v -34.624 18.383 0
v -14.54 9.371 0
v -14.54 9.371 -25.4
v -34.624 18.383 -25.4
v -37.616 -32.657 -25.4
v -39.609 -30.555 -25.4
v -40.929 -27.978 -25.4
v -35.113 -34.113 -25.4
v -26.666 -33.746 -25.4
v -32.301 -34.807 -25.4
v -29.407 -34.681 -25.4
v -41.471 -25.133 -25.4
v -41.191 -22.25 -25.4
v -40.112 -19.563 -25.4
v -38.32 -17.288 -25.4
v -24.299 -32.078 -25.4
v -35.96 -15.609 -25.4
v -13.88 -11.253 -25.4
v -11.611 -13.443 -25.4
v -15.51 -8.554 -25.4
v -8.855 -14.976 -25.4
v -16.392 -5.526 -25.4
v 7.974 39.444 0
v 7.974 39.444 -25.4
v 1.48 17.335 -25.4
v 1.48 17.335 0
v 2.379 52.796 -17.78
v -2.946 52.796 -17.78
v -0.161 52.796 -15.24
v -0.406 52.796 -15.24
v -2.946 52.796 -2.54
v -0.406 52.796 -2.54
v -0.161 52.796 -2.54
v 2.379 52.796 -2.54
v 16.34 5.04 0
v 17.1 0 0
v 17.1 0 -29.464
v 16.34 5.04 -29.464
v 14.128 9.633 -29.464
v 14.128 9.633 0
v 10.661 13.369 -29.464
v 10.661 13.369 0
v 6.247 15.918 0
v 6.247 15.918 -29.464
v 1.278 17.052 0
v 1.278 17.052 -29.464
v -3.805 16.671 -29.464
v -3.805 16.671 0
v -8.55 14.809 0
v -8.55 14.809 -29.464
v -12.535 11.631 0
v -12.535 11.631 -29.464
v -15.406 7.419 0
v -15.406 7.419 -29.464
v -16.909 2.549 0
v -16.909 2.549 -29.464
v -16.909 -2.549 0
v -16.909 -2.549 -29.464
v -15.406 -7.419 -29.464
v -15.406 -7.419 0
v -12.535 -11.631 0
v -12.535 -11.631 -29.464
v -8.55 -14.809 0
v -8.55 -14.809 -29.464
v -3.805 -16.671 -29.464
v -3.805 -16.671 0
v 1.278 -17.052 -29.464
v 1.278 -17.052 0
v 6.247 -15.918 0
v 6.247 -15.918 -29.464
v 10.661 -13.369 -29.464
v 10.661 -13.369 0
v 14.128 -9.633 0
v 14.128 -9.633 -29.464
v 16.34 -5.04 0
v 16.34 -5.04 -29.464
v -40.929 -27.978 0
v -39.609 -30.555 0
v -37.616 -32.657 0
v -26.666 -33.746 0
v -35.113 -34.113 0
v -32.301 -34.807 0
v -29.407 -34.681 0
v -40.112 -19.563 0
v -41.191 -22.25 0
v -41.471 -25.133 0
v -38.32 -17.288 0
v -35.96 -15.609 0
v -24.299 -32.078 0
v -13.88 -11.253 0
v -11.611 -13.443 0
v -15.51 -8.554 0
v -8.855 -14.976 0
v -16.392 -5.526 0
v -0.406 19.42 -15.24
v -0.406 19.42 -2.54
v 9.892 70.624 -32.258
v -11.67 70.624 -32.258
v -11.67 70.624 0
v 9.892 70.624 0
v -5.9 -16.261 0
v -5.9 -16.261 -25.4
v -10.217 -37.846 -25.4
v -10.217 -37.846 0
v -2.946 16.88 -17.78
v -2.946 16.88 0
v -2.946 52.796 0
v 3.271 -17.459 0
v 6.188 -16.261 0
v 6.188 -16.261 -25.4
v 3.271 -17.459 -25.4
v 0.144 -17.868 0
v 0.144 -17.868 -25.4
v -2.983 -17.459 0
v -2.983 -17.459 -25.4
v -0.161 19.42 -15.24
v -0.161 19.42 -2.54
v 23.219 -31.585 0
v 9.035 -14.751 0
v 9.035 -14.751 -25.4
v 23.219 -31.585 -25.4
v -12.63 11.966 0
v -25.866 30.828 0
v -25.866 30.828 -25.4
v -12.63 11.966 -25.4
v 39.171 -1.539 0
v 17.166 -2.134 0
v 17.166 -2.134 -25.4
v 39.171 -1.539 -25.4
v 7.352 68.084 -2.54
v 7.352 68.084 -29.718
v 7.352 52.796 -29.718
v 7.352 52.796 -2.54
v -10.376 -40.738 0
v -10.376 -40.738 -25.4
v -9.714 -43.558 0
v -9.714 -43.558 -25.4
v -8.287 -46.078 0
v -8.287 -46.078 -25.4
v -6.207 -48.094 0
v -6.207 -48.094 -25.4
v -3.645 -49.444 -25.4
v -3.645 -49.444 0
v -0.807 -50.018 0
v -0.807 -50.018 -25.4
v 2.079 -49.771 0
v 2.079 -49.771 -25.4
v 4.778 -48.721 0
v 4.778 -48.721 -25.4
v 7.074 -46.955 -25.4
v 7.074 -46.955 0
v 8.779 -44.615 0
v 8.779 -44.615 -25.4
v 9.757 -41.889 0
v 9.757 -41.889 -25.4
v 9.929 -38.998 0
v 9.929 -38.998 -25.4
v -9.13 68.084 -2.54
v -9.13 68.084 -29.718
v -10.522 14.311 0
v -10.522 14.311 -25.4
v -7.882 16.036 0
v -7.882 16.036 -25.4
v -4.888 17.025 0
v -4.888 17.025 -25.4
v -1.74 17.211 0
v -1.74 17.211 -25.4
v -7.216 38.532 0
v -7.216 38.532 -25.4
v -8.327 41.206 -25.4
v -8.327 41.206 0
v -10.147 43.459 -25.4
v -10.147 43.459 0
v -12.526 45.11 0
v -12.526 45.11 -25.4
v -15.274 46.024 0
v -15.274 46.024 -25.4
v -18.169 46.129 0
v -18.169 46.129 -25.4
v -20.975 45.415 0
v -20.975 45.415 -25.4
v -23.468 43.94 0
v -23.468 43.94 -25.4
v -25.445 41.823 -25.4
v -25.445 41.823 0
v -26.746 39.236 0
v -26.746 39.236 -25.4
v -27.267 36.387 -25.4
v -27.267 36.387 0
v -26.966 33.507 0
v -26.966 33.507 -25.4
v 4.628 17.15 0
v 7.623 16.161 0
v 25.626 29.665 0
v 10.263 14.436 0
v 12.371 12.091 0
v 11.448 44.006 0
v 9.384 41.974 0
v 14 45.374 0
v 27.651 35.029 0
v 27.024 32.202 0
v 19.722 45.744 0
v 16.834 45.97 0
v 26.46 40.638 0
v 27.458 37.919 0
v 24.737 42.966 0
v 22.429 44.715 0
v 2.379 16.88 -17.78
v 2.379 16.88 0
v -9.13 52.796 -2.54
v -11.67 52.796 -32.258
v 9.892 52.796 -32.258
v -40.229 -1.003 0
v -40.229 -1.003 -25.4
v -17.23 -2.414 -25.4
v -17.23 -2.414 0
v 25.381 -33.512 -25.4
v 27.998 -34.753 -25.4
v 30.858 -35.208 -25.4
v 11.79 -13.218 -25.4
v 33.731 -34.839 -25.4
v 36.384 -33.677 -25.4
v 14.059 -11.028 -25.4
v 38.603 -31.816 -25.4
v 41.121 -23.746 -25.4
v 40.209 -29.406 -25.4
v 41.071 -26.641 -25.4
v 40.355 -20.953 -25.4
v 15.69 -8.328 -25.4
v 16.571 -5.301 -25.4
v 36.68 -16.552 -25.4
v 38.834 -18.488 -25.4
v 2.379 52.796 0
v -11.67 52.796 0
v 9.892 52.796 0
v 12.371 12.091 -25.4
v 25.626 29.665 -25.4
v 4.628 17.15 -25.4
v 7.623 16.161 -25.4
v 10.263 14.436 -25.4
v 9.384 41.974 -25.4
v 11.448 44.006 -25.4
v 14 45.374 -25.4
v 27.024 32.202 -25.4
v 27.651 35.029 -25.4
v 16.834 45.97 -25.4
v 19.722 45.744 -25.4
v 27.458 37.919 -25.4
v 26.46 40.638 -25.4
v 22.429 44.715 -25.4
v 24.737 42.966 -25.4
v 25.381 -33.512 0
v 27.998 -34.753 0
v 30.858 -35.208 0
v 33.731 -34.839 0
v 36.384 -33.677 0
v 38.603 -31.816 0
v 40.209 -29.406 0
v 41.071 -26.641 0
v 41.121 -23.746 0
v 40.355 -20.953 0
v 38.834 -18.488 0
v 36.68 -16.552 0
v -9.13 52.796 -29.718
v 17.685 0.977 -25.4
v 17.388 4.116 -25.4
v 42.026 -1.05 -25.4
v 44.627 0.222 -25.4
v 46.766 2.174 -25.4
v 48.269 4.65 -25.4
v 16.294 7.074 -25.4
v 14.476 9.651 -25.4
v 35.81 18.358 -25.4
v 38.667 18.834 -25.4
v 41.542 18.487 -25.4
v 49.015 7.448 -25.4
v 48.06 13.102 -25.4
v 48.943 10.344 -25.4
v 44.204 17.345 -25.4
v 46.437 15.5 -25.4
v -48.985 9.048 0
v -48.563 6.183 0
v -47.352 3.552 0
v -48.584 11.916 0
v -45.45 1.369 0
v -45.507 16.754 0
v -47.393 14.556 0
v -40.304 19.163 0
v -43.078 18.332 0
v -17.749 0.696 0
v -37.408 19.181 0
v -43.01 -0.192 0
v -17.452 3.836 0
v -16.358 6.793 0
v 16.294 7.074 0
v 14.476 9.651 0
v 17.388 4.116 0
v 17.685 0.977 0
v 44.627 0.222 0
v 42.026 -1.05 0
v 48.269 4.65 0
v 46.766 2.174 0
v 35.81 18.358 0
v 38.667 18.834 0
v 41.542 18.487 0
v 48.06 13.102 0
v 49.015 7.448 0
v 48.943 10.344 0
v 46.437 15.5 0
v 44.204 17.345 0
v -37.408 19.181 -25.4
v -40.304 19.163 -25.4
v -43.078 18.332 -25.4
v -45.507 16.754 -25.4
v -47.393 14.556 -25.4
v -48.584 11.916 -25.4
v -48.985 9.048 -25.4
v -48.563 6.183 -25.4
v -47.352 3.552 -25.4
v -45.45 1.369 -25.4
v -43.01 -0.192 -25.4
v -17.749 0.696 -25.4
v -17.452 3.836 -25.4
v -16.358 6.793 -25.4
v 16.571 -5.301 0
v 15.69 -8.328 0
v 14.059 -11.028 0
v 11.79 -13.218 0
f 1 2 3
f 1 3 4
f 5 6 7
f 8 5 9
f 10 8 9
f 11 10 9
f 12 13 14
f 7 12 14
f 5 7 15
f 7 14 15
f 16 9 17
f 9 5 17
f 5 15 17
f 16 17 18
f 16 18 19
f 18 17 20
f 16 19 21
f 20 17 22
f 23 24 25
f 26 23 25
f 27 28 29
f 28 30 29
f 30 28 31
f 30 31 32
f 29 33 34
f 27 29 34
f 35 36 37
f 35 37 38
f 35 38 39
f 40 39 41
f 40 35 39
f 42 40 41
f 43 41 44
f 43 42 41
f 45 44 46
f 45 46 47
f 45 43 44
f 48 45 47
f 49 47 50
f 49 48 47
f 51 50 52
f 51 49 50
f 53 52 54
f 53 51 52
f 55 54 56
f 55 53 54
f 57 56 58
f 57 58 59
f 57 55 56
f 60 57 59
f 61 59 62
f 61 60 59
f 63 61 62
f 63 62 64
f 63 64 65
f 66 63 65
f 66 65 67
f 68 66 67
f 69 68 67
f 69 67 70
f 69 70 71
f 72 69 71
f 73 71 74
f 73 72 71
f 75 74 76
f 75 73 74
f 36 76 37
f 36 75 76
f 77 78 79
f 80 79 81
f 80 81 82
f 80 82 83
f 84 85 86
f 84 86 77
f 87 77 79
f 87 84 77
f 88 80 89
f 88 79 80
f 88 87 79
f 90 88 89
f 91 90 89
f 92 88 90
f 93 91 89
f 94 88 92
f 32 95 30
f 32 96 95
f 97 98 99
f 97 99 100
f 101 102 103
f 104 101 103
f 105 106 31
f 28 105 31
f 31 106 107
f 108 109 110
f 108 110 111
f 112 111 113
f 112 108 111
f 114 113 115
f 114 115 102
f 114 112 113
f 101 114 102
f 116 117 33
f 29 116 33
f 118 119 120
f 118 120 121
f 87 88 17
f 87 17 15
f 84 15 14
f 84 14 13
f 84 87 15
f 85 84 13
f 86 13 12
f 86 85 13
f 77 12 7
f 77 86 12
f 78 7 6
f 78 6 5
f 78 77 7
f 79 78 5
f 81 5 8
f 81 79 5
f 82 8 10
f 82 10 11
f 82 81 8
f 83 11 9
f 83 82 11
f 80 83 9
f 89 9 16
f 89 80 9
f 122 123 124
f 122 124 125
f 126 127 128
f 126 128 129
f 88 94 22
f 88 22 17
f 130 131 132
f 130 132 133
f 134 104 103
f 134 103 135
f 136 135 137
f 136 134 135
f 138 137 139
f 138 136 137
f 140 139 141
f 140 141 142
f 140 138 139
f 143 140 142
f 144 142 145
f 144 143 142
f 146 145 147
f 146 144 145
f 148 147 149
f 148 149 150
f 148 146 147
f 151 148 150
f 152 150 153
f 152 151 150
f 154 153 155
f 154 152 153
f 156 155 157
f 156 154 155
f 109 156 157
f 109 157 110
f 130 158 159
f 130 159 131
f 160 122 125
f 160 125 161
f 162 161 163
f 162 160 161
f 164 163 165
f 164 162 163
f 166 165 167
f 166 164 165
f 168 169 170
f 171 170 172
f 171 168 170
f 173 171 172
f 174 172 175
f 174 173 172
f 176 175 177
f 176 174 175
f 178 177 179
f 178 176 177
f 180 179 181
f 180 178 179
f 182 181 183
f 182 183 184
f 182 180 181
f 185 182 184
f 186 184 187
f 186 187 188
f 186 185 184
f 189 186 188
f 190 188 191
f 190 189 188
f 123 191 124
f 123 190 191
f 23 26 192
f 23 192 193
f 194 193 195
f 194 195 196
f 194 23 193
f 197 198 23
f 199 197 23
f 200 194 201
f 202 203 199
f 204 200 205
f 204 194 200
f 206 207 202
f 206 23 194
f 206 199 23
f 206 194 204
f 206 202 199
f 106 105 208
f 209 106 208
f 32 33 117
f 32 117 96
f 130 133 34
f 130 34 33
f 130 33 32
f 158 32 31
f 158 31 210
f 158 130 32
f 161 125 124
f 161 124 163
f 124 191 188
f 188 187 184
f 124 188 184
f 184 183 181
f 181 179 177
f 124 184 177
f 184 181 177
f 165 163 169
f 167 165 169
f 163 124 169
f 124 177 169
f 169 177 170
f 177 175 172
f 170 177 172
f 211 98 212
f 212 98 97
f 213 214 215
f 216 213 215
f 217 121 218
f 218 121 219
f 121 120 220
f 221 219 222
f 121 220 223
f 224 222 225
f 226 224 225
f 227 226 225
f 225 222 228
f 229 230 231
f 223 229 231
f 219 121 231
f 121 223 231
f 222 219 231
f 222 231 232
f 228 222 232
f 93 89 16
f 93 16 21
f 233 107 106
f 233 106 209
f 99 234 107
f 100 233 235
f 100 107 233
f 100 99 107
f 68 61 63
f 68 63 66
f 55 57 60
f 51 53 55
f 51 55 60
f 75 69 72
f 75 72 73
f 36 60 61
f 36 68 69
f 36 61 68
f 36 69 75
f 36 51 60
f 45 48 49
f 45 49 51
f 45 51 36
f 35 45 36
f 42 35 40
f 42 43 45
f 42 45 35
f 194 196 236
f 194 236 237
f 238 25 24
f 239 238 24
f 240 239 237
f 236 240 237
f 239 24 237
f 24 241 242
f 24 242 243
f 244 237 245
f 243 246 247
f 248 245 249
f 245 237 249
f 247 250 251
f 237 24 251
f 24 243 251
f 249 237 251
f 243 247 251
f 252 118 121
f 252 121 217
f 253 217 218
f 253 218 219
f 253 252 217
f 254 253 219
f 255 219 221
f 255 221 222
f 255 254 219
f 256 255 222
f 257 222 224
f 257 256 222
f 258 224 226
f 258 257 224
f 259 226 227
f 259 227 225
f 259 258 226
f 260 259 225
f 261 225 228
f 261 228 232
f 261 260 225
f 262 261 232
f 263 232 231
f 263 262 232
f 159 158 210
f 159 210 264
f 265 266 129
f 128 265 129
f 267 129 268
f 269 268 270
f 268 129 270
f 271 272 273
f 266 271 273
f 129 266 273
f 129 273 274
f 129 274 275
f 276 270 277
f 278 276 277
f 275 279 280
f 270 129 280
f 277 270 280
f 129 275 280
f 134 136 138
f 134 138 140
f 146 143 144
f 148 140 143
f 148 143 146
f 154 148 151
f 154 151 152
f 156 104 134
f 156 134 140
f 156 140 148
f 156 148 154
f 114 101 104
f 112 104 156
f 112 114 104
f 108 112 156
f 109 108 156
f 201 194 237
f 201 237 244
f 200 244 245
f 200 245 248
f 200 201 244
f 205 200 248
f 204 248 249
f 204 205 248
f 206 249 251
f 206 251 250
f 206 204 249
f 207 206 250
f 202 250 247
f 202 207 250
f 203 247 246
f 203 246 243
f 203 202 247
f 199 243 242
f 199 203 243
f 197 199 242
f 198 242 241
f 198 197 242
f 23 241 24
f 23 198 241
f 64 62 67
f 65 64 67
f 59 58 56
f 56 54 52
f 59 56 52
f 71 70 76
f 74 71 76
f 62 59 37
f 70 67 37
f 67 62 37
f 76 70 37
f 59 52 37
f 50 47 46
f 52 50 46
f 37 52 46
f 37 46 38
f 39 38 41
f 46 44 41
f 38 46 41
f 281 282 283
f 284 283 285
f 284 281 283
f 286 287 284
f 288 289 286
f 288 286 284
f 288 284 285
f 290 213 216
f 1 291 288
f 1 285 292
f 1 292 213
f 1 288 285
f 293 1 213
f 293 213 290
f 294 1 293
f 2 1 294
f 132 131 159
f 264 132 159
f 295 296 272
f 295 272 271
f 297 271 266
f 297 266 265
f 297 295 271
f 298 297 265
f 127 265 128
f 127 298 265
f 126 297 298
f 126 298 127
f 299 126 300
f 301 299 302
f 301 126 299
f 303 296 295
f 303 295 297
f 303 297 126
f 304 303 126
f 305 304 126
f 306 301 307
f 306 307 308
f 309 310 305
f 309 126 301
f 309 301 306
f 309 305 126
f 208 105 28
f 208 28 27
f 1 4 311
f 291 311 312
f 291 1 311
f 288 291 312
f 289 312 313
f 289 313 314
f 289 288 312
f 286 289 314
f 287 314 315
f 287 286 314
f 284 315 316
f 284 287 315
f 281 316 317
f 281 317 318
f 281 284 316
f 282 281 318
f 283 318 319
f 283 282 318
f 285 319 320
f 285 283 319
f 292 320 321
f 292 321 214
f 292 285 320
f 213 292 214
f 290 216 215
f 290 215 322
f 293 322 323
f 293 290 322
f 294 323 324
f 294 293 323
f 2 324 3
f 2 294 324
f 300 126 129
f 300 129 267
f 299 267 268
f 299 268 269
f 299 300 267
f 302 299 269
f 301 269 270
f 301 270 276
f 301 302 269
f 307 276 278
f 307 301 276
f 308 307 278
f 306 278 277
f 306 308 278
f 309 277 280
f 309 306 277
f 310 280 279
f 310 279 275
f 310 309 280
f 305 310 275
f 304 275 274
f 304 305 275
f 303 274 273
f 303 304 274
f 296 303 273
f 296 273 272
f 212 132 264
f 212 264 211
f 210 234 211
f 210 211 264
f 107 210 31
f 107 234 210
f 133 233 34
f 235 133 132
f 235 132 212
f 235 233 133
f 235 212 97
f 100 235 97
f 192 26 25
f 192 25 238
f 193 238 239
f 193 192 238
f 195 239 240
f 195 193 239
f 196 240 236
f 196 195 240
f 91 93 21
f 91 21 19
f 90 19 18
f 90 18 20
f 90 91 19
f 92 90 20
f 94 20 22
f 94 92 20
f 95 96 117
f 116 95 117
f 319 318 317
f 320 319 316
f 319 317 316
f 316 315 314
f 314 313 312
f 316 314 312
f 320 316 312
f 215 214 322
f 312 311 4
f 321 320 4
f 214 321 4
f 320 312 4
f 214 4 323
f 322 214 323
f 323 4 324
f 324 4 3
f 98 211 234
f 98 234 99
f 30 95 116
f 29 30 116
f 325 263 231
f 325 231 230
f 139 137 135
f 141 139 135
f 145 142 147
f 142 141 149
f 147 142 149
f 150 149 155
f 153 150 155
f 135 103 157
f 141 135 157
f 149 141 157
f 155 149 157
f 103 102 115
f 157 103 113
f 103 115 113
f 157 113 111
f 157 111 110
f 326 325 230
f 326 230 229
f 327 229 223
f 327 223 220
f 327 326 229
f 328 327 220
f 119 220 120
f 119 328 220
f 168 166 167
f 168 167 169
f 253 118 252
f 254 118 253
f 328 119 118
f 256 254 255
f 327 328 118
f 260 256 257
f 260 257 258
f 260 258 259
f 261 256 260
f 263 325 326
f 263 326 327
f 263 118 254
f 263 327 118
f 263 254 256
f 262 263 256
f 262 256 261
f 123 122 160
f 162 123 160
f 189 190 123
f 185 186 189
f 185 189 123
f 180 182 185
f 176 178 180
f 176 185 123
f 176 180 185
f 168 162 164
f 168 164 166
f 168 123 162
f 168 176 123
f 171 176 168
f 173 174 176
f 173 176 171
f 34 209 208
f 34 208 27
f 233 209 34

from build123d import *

# Parameters (mm, degrees)
F2_DEPTH = 25.4
F0_R     = 17.0996377698
F3_DEPTH = 29.464
F4_W     = 5.3243252914
F4_H     = 45.9828209132
F5_DEPTH = 17.78
F6_W     = 21.5624216944
F6_H     = 17.8282521665
F7_DEPTH = 32.258
F8_T     = -2.54


# Not quite as in the source:
# - a shell that OpenCascade refuses in one call is made with other operations: the cavity is built on its own and cut out


with BuildPart() as f2:
    # F1 (on Top) → F2 (new body)
    with BuildSketch(Plane.XY):
        with BuildLine():
            ThreePointArc((6.1878240667, -16.2610262632), (0.1439033076, -17.8679735925), (-5.9000174515, -16.2610262632))
            Line((-5.9000174515, -16.2610262632), (-10.2171041071, -37.8464572132))
            ThreePointArc((-10.2171041071, -37.8464572132), (-0.8065285186, -50.0180206018), (9.9292984232, -38.9976799488))
            Line((9.9292984232, -38.9976799488), (6.1878240667, -16.2610262632))
        make_face()
    extrude(amount=-F2_DEPTH)


with BuildPart() as f2b:
    # F1 (on Top) → F2, piece 2 (new body)
    with BuildSketch(Plane.XY):
        with BuildLine():
            ThreePointArc((16.5714274711, -5.3007483795), (14.0594665273, -11.0279911785), (9.034781558, -14.7514034336))
            Line((9.034781558, -14.7514034336), (23.2192915338, -31.5849337595))
            ThreePointArc((23.2192915338, -31.5849337595), (38.602800891, -31.8162951417), (36.6804302337, -16.5516176381))
            Line((36.6804302337, -16.5516176381), (16.5714274711, -5.3007483795))
        make_face()
    extrude(amount=-F2_DEPTH)


with BuildPart() as f2c:
    # F1 (on Top) → F2, piece 3 (new body)
    with BuildSketch(Plane.XY):
        with BuildLine():
            ThreePointArc((14.4764079943, 9.6511011495), (17.387964691, 4.116293523), (17.1662057784, -2.1336729446))
            Line((17.1662057784, -2.1336729446), (39.1710870626, -1.5393109697))
            ThreePointArc((39.1710870626, -1.5393109697), (48.9434338759, 10.3437494942), (35.8104499338, 18.3581503455))
            Line((35.8104499338, 18.3581503455), (14.4764079943, 9.6511011495))
        make_face()
    extrude(amount=-F2_DEPTH)


with BuildPart() as f2d:
    # F1 (on Top) → F2, piece 4 (new body)
    with BuildSketch(Plane.XY):
        with BuildLine():
            ThreePointArc((1.4803580328, 17.3354746664), (7.6229707926, 16.1609252445), (12.3711269209, 12.0907567906))
            Line((12.3711269209, 12.0907567906), (25.6262550887, 29.6654443765))
            ThreePointArc((25.6262550887, 29.6654443765), (22.4286628882, 44.7147397869), (7.9744704337, 39.443856681))
            Line((7.9744704337, 39.443856681), (1.4803580328, 17.3354746664))
        make_face()
    extrude(amount=-F2_DEPTH)


with BuildPart() as f2e:
    # F1 (on Top) → F2, piece 5 (new body)
    with BuildSketch(Plane.XY):
        with BuildLine():
            ThreePointArc((-12.6304317212, 11.9658821802), (-7.8822755929, 16.0360506342), (-1.7396628331, 17.210600056))
            Line((-1.7396628331, 17.210600056), (-7.2156696473, 38.5315150424))
            ThreePointArc((-7.2156696473, 38.5315150424), (-20.9753487157, 45.4146190056), (-25.8664479525, 30.8275344276))
            Line((-25.8664479525, 30.8275344276), (-12.6304317212, 11.9658821802))
        make_face()
    extrude(amount=-F2_DEPTH)


with BuildPart() as f2f:
    # F1 (on Top) → F2, piece 6 (new body)
    with BuildSketch(Plane.XY):
        with BuildLine():
            ThreePointArc((-17.2302487752, -2.4142636471), (-17.4520076879, 3.8357028205), (-14.5404509911, 9.370510447))
            Line((-14.5404509911, 9.370510447), (-34.6240479661, 18.3825689817))
            ThreePointArc((-34.6240479661, 18.3825689817), (-48.5844949175, 11.9163638237), (-40.2294034511, -1.0025500169))
            Line((-40.2294034511, -1.0025500169), (-17.2302487752, -2.4142636471))
        make_face()
    extrude(amount=-F2_DEPTH)


with BuildPart() as f2g:
    # F1 (on Top) → F2, piece 7 (new body)
    with BuildSketch(Plane.XY):
        with BuildLine():
            ThreePointArc((-8.8553370685, -14.9764197062), (-13.8800220378, -11.2530074511), (-16.3919829816, -5.5257646522))
            Line((-16.3919829816, -5.5257646522), (-35.9598119645, -15.6088264583))
            ThreePointArc((-35.9598119645, -15.6088264583), (-39.6085255034, -30.555156367), (-24.2987976207, -32.0776938503))
            Line((-24.2987976207, -32.0776938503), (-8.8553370685, -14.9764197062))
        make_face()
    extrude(amount=-F2_DEPTH)


with BuildPart() as f3:
    # F0 (on Top) → F3 (new body)
    with BuildSketch(Plane.XY):
        Circle(F0_R)
    extrude(amount=-F3_DEPTH)


with BuildPart() as f5:
    # F4 (on Top) → F5 (new body)
    with BuildSketch(Plane.XY):
        with Locations((-0.2835408086, 39.8713285103)):
            Rectangle(F4_W, F4_H)
    extrude(amount=-F5_DEPTH)

    # F6 (on Top) → F7 (join)
    with BuildSketch(Plane.XY):
        with Locations((-0.8888551965, 61.7097709328)):
            Rectangle(F6_W, F6_H)
    extrude(amount=-F7_DEPTH)

    # F8: a shell. OpenCascade refuses it in one call, so the cavity is built on its own and cut out:
    # the body offset inwards by the wall thickness, plus a prism from it out through each open face.
    f8_core = offset(f5.part, amount=F8_T, kind=Kind.INTERSECTION, mode=Mode.PRIVATE)
    f8_exits = [f8_core.faces().sort_by_distance(p)[0] for p in [
        (-0.893077, 55.335645, -16.179493),
    ]]
    add(f8_core, mode=Mode.SUBTRACT)
    extrude(f8_exits, amount=-F8_T, mode=Mode.SUBTRACT)


solid = Compound([f2.part, f2b.part, f2c.part, f2d.part, f2e.part, f2f.part, f2g.part, f3.part, f5.part])
